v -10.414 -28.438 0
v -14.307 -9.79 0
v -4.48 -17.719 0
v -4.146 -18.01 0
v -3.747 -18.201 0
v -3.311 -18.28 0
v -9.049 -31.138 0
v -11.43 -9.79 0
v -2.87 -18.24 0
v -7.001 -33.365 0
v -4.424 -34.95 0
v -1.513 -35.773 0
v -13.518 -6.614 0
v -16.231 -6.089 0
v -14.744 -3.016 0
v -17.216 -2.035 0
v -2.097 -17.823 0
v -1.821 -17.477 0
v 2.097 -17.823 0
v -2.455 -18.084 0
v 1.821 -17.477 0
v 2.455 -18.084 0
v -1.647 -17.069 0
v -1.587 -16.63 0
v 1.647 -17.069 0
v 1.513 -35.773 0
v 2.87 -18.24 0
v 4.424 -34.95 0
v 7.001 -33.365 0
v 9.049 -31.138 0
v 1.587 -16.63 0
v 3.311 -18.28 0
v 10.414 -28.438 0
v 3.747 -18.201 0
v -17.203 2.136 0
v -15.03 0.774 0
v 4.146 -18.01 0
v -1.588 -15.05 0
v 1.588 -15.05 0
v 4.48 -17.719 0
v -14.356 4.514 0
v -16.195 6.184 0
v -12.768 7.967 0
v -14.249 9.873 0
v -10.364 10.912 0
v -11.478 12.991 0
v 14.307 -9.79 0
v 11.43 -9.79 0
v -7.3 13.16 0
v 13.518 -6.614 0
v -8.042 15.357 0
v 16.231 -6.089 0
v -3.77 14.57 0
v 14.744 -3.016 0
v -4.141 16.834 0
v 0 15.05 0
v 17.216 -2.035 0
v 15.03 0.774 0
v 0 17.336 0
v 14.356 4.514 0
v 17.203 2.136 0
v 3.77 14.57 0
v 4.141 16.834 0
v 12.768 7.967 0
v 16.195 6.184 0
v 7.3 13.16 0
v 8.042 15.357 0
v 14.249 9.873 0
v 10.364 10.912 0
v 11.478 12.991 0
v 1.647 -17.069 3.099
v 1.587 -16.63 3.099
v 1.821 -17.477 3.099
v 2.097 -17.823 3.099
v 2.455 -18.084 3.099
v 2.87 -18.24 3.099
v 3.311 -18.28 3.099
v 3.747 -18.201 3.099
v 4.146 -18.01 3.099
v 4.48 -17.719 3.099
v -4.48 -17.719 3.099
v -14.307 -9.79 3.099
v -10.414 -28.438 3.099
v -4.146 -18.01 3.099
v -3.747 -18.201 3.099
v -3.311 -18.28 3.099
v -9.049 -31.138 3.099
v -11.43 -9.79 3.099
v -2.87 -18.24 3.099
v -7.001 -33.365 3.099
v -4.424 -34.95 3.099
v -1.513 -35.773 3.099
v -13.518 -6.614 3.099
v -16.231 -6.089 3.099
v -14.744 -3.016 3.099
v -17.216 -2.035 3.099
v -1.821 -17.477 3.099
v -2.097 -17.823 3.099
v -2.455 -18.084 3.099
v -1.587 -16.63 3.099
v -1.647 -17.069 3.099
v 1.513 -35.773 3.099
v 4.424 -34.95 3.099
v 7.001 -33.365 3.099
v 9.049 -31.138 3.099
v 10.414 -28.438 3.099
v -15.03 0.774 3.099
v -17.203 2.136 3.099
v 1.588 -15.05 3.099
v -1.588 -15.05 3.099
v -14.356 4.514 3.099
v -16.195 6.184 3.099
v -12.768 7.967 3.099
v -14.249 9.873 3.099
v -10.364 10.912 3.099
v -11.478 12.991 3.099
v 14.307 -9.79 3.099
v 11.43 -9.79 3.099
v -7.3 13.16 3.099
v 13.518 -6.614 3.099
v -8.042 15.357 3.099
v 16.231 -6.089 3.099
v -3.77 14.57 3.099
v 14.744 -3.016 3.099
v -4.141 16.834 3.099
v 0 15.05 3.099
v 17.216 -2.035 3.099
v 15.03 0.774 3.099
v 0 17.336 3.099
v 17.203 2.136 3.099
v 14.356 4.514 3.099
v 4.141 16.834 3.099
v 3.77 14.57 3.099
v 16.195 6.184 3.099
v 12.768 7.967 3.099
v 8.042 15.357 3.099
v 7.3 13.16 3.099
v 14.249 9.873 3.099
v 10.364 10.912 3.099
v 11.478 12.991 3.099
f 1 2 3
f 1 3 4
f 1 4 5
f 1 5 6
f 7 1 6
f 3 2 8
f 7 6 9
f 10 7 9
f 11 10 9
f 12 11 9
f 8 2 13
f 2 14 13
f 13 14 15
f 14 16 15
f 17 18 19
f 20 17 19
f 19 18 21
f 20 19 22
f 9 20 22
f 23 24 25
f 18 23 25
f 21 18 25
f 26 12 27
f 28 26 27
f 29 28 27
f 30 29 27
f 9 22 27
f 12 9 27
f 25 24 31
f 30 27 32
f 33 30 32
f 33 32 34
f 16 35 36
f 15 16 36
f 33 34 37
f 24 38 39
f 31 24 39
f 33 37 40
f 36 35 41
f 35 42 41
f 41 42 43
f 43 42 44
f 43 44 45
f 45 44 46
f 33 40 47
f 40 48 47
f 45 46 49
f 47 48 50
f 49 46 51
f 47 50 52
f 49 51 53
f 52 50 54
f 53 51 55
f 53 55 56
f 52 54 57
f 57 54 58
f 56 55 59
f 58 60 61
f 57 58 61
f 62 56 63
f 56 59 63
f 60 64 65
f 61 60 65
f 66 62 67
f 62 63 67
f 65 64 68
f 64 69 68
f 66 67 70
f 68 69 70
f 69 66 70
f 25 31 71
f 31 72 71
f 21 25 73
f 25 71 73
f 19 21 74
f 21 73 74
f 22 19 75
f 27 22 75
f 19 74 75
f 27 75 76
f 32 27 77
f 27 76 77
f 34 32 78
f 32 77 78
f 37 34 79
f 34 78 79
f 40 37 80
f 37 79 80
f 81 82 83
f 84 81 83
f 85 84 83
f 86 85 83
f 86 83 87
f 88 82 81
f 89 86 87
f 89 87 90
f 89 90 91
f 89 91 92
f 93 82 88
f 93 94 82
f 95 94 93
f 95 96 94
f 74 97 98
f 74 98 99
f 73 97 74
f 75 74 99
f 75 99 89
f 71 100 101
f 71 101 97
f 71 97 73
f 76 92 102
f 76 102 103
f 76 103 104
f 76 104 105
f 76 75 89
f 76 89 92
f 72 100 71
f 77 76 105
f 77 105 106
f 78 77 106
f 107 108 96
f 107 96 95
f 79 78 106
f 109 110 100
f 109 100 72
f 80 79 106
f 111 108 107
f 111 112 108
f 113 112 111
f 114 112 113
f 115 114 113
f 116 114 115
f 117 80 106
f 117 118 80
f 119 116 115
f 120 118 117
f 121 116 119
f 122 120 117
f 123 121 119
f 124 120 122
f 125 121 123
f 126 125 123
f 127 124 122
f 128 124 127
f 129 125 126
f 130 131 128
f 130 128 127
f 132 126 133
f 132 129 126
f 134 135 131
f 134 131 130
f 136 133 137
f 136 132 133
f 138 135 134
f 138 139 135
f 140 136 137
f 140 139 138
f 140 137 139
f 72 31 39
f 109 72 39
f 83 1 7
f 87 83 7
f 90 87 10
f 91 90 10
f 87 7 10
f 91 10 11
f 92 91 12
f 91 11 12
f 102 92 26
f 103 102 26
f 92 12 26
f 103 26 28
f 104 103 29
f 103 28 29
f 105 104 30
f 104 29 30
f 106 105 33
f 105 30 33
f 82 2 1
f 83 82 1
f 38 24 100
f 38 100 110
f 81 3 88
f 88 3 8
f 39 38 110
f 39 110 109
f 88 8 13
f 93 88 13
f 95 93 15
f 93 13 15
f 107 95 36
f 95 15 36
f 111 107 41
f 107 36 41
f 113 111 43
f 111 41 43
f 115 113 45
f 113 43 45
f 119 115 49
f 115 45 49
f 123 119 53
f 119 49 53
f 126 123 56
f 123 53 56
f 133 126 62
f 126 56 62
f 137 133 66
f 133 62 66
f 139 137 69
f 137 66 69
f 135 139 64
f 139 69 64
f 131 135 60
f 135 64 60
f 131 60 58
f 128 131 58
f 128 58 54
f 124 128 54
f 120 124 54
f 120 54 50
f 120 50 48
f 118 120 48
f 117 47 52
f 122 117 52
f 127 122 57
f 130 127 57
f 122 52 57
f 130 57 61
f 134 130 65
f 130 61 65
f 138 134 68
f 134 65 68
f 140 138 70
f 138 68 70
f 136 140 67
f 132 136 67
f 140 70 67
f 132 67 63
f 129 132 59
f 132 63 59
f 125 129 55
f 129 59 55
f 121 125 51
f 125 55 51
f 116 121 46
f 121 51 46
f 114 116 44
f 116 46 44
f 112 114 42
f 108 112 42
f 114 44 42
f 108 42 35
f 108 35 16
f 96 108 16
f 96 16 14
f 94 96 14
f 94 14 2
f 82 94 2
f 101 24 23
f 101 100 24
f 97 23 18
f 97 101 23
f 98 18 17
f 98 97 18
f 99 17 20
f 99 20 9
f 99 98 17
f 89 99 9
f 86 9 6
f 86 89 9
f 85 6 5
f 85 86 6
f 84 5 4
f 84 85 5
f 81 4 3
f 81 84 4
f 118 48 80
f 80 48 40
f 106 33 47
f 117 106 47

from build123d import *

# Parameters (mm, degrees)
F1_DEPTH = 3.0988
F0_W     = 3.175
F0_H     = 1.778
F2_DEPTH = 3.0988
F3_R     = 1.651


with BuildPart() as f1:
    # F0 (on Top) → F1 (new body)
    with BuildSketch(Plane.XY):
        with BuildLine():
            ThreePointArc((14.306537, -9.789921), (0, 17.3355), (-14.306537, -9.789921))
            Line((-14.306537, -9.789921), (-10.414, -28.437995))
            ThreePointArc((-10.414, -28.437995), (0, -35.8775), (10.414, -28.437995))
            Line((10.414, -28.437995), (14.306537, -9.789921))
        make_face()
        with BuildLine():
            Line((1.5875, -16.8275), (-1.5875, -16.8275))
            Line((-1.5875, -16.8275), (-1.5875, -21.0185))
            Line((-1.5875, -21.0185), (-11.43, -9.789921))
            ThreePointArc((-11.43, -9.789921), (0, 15.0495), (11.43, -9.789921))
            Line((11.43, -9.789921), (1.5875, -21.0185))
            Line((1.5875, -21.0185), (1.5875, -16.8275))
        make_face(mode=Mode.SUBTRACT)
    extrude(amount=F1_DEPTH)

    # F0 (on Top) → F2 (join)
    with BuildSketch(Plane.XY):
        with Locations((0, -15.9385)):
            Rectangle(F0_W, F0_H)
    extrude(amount=F2_DEPTH)

    # F3
    f3_edges = [f1.edges().sort_by_distance(p)[0] for p in [
        (-1.5875, -21.0185, 1.5494),
        (1.5875, -21.0185, 1.5494),
    ]]
    fillet(f3_edges, radius=F3_R)


solid = f1.part
